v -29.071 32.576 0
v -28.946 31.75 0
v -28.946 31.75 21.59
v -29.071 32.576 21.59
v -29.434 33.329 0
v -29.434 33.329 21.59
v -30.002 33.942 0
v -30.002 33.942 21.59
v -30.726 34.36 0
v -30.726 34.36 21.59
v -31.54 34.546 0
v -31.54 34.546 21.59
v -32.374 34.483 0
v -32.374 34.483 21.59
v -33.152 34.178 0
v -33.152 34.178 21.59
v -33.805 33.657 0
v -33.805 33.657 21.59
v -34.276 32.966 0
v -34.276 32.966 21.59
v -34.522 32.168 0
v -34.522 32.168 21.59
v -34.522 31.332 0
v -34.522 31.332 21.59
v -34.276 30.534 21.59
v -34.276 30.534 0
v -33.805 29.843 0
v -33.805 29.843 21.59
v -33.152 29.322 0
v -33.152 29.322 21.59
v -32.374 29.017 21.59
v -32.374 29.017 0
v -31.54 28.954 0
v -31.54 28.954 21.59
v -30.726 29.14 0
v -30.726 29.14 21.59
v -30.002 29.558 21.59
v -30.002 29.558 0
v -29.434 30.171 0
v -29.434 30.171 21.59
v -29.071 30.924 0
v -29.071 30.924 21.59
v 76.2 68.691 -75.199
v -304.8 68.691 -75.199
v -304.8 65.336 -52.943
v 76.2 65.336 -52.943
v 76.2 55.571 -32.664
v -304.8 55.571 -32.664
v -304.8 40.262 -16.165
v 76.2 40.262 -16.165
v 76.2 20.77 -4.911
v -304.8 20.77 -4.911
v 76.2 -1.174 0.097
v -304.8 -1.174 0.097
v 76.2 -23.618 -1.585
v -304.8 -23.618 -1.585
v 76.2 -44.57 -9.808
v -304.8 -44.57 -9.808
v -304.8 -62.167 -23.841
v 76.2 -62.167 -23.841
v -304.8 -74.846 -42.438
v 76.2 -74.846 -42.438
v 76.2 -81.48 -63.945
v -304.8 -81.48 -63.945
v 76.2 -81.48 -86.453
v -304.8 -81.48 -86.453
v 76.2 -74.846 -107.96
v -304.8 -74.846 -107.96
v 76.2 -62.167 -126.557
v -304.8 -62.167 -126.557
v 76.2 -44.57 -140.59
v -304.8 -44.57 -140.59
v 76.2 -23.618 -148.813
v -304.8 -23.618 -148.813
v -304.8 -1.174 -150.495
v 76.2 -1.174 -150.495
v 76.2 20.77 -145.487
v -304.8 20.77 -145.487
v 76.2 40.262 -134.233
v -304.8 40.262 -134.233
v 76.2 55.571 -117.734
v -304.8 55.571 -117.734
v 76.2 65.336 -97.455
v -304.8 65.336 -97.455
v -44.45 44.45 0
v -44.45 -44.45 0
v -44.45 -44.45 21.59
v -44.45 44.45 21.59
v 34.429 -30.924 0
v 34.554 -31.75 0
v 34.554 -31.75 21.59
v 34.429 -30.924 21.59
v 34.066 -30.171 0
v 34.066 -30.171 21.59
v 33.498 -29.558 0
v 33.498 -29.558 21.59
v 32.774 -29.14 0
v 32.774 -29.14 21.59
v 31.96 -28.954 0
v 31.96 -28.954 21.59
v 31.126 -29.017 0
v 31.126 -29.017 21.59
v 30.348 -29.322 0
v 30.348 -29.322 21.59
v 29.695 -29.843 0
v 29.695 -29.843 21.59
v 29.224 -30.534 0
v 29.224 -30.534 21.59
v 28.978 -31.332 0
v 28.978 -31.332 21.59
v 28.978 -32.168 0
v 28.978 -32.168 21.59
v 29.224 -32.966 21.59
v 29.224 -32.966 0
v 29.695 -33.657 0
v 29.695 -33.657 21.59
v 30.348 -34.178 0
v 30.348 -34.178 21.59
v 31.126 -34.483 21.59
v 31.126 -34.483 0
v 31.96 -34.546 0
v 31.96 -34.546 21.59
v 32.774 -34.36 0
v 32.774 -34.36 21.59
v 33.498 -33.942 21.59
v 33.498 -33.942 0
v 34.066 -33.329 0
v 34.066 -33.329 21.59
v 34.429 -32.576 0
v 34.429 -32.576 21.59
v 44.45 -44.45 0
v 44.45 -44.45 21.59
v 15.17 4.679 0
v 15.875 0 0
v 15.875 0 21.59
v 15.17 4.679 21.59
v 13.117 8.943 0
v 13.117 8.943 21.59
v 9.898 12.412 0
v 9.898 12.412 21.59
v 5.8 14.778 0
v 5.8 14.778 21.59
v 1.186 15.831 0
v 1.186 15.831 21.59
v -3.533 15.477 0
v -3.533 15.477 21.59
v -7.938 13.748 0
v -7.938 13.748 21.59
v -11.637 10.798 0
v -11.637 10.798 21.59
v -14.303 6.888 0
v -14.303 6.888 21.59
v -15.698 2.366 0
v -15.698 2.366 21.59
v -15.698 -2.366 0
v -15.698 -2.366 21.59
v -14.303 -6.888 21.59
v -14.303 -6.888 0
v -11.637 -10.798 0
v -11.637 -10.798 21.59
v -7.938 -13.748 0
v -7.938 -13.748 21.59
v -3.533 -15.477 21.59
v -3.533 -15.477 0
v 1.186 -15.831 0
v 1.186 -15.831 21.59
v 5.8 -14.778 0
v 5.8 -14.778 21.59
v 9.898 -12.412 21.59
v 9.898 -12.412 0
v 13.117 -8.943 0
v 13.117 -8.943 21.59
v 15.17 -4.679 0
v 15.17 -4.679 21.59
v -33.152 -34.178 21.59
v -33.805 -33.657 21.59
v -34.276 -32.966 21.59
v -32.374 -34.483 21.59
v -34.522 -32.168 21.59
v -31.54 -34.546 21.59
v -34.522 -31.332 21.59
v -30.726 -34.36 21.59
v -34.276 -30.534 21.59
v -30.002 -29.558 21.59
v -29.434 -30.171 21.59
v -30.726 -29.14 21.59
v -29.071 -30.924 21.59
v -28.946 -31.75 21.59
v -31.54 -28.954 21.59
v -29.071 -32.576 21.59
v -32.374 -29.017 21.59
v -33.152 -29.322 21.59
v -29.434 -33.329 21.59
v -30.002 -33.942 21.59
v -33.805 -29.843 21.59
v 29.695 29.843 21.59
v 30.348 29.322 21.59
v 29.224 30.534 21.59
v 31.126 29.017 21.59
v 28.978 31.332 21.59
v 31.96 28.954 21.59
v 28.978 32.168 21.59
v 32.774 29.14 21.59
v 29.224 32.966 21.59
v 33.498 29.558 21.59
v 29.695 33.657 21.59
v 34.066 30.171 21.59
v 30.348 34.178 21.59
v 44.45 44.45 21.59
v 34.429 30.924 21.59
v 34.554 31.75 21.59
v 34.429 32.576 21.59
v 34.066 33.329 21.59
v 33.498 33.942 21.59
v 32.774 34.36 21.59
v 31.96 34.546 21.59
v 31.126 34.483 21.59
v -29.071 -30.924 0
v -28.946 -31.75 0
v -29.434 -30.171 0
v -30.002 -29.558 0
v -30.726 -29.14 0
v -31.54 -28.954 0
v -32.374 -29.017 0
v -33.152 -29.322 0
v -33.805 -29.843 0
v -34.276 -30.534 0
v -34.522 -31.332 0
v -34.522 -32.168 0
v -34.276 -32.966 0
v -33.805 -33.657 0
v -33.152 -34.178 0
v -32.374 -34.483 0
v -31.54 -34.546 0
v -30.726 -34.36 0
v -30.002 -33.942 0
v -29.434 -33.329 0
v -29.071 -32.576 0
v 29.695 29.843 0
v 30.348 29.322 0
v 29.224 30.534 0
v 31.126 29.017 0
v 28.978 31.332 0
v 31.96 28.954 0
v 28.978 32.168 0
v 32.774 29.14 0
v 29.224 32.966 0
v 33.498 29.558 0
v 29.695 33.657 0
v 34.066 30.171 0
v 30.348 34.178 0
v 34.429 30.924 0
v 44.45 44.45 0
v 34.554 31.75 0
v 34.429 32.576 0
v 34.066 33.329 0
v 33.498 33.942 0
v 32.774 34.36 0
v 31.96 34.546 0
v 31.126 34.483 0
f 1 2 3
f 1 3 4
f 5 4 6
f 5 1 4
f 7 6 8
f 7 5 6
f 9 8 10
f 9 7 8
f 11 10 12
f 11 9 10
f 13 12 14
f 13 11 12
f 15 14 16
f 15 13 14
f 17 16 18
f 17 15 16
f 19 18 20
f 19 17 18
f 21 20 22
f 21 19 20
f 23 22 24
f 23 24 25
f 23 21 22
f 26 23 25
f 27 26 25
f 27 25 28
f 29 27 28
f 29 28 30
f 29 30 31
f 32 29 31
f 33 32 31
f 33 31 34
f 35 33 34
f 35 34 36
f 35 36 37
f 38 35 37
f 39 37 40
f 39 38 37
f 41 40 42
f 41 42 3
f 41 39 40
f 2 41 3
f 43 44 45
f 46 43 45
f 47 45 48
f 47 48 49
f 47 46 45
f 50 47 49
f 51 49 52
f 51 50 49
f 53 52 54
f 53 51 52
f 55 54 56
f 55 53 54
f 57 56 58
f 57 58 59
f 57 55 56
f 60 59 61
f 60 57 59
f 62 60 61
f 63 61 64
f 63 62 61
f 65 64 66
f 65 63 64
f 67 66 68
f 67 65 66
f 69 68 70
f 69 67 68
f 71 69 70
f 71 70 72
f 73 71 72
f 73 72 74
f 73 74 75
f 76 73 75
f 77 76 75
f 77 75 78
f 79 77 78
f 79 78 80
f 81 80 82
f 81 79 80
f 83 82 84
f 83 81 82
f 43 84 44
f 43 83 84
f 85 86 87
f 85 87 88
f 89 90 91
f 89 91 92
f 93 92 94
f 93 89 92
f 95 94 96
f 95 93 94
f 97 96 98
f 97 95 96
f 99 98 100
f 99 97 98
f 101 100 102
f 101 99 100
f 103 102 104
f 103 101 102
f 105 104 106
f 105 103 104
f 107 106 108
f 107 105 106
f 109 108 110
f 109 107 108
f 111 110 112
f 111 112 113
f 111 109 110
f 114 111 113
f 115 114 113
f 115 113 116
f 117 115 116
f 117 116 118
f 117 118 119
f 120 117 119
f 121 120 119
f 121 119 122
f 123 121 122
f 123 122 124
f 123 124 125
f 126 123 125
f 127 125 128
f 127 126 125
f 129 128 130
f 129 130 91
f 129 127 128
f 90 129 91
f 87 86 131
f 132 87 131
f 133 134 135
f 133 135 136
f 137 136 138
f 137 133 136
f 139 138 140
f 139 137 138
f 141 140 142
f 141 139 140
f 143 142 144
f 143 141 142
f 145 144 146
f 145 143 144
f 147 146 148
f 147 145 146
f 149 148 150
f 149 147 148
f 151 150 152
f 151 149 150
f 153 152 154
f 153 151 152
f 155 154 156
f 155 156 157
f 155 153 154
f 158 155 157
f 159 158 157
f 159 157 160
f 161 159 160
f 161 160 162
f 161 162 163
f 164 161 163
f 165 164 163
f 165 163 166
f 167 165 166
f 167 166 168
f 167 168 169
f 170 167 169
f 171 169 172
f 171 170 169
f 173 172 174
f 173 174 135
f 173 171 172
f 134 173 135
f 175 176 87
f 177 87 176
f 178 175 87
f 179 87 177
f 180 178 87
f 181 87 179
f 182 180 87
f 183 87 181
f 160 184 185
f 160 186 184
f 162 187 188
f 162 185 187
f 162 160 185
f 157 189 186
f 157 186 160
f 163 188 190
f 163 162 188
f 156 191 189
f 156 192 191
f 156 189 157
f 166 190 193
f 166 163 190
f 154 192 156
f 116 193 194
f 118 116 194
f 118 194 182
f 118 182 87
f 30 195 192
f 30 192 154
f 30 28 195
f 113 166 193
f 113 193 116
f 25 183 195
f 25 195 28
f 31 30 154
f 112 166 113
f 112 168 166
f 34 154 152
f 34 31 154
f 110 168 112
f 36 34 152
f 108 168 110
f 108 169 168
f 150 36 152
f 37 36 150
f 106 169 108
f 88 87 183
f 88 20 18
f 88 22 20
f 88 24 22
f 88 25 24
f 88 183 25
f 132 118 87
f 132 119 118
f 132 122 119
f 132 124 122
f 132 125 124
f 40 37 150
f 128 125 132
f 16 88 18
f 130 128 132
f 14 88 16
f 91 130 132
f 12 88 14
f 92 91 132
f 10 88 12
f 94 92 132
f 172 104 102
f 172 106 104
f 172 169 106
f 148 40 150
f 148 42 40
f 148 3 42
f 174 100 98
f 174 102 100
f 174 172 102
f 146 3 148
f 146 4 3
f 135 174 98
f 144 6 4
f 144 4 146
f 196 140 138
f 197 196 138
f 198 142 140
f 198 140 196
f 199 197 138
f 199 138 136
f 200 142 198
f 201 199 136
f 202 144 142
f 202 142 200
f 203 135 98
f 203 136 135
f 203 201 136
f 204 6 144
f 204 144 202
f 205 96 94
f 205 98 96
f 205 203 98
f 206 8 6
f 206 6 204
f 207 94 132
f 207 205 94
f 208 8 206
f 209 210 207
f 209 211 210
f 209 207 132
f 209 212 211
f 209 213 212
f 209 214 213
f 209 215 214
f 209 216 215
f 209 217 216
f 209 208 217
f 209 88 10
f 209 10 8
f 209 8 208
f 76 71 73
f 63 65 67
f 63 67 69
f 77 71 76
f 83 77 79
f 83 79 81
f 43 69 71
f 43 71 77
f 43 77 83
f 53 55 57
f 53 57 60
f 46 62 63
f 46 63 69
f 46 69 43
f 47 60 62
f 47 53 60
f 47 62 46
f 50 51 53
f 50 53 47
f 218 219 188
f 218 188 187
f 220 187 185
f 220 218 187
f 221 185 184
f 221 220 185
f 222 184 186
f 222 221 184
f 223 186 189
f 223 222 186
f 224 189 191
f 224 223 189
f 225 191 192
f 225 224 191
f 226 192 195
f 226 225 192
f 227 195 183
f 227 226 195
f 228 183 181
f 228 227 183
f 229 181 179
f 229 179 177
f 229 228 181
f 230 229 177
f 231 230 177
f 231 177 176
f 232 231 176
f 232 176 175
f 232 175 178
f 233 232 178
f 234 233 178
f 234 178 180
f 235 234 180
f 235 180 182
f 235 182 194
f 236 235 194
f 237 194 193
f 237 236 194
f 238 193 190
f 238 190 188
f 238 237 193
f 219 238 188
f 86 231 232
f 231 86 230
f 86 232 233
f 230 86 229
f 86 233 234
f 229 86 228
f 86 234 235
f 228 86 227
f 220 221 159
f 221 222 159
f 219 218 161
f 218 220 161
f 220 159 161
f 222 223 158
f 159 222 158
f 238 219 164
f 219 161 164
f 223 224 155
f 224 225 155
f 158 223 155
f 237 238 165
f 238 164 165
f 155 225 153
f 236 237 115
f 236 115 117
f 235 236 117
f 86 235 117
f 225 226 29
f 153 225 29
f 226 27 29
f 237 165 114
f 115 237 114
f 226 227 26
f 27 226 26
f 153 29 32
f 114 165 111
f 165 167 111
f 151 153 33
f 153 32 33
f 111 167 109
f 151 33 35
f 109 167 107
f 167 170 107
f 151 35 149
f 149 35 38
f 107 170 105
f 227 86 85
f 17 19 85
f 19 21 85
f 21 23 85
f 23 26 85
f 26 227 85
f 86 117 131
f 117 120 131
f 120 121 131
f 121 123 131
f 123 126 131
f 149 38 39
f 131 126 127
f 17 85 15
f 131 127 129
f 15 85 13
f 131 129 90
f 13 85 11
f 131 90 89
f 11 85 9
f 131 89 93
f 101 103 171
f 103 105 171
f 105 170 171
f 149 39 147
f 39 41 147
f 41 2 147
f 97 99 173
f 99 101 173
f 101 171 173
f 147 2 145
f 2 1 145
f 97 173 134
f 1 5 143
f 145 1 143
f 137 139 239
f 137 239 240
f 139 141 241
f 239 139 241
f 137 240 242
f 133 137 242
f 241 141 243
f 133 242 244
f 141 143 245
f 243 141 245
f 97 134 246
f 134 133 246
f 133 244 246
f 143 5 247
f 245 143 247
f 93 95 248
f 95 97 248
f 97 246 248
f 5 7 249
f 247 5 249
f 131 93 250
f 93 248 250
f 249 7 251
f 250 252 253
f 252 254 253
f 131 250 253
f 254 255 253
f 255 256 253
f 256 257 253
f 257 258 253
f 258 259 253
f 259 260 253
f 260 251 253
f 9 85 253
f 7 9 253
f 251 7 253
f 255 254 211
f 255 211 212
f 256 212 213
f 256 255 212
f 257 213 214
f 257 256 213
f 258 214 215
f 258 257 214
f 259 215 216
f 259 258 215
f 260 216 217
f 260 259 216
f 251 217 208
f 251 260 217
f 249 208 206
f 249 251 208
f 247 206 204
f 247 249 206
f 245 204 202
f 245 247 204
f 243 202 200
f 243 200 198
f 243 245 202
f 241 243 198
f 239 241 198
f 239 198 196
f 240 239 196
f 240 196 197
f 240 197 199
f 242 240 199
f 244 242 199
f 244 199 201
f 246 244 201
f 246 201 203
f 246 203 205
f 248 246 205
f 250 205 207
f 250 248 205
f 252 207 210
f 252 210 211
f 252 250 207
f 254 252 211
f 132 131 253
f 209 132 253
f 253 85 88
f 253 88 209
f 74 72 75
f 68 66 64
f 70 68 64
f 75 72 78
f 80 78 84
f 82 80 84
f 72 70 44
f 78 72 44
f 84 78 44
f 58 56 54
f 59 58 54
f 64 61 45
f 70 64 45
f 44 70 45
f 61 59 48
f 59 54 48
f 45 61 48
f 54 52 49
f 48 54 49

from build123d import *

# Parameters (mm, degrees)
F0_W          = 88.9
F0_H          = 88.9
F0_R          = 2.803559
F0_R_2        = 15.875
F1_DEPTH      = 21.59
F2_R          = 75.507196
F3_DEPTH      = 76.2
F3_DEPTH_BACK = 304.8


with BuildPart() as f1:
    # F0 (on Top) → F1 (new body)
    with BuildSketch(Plane.XY):
        Rectangle(F0_W, F0_H)
        with Locations((-31.75, -31.75)):
            Circle(F0_R, mode=Mode.SUBTRACT)
        with Locations((31.75, -31.75)):
            Circle(F0_R, mode=Mode.SUBTRACT)
        with Locations((-31.75, 31.75)):
            Circle(F0_R, mode=Mode.SUBTRACT)
        Circle(F0_R_2, mode=Mode.SUBTRACT)
        with Locations((31.75, 31.75)):
            Circle(F0_R, mode=Mode.SUBTRACT)
    extrude(amount=F1_DEPTH)


with BuildPart() as f3:
    # F2 (on Right) → F3 (new body, two sides)
    with BuildSketch(Plane.YZ) as f3_sk:
        with Locations((-6.816271, -75.198904)):
            Circle(F2_R)
    extrude(amount=F3_DEPTH)
    extrude(f3_sk.sketch, amount=-F3_DEPTH_BACK)


solid = Compound([f1.part, f3.part])
